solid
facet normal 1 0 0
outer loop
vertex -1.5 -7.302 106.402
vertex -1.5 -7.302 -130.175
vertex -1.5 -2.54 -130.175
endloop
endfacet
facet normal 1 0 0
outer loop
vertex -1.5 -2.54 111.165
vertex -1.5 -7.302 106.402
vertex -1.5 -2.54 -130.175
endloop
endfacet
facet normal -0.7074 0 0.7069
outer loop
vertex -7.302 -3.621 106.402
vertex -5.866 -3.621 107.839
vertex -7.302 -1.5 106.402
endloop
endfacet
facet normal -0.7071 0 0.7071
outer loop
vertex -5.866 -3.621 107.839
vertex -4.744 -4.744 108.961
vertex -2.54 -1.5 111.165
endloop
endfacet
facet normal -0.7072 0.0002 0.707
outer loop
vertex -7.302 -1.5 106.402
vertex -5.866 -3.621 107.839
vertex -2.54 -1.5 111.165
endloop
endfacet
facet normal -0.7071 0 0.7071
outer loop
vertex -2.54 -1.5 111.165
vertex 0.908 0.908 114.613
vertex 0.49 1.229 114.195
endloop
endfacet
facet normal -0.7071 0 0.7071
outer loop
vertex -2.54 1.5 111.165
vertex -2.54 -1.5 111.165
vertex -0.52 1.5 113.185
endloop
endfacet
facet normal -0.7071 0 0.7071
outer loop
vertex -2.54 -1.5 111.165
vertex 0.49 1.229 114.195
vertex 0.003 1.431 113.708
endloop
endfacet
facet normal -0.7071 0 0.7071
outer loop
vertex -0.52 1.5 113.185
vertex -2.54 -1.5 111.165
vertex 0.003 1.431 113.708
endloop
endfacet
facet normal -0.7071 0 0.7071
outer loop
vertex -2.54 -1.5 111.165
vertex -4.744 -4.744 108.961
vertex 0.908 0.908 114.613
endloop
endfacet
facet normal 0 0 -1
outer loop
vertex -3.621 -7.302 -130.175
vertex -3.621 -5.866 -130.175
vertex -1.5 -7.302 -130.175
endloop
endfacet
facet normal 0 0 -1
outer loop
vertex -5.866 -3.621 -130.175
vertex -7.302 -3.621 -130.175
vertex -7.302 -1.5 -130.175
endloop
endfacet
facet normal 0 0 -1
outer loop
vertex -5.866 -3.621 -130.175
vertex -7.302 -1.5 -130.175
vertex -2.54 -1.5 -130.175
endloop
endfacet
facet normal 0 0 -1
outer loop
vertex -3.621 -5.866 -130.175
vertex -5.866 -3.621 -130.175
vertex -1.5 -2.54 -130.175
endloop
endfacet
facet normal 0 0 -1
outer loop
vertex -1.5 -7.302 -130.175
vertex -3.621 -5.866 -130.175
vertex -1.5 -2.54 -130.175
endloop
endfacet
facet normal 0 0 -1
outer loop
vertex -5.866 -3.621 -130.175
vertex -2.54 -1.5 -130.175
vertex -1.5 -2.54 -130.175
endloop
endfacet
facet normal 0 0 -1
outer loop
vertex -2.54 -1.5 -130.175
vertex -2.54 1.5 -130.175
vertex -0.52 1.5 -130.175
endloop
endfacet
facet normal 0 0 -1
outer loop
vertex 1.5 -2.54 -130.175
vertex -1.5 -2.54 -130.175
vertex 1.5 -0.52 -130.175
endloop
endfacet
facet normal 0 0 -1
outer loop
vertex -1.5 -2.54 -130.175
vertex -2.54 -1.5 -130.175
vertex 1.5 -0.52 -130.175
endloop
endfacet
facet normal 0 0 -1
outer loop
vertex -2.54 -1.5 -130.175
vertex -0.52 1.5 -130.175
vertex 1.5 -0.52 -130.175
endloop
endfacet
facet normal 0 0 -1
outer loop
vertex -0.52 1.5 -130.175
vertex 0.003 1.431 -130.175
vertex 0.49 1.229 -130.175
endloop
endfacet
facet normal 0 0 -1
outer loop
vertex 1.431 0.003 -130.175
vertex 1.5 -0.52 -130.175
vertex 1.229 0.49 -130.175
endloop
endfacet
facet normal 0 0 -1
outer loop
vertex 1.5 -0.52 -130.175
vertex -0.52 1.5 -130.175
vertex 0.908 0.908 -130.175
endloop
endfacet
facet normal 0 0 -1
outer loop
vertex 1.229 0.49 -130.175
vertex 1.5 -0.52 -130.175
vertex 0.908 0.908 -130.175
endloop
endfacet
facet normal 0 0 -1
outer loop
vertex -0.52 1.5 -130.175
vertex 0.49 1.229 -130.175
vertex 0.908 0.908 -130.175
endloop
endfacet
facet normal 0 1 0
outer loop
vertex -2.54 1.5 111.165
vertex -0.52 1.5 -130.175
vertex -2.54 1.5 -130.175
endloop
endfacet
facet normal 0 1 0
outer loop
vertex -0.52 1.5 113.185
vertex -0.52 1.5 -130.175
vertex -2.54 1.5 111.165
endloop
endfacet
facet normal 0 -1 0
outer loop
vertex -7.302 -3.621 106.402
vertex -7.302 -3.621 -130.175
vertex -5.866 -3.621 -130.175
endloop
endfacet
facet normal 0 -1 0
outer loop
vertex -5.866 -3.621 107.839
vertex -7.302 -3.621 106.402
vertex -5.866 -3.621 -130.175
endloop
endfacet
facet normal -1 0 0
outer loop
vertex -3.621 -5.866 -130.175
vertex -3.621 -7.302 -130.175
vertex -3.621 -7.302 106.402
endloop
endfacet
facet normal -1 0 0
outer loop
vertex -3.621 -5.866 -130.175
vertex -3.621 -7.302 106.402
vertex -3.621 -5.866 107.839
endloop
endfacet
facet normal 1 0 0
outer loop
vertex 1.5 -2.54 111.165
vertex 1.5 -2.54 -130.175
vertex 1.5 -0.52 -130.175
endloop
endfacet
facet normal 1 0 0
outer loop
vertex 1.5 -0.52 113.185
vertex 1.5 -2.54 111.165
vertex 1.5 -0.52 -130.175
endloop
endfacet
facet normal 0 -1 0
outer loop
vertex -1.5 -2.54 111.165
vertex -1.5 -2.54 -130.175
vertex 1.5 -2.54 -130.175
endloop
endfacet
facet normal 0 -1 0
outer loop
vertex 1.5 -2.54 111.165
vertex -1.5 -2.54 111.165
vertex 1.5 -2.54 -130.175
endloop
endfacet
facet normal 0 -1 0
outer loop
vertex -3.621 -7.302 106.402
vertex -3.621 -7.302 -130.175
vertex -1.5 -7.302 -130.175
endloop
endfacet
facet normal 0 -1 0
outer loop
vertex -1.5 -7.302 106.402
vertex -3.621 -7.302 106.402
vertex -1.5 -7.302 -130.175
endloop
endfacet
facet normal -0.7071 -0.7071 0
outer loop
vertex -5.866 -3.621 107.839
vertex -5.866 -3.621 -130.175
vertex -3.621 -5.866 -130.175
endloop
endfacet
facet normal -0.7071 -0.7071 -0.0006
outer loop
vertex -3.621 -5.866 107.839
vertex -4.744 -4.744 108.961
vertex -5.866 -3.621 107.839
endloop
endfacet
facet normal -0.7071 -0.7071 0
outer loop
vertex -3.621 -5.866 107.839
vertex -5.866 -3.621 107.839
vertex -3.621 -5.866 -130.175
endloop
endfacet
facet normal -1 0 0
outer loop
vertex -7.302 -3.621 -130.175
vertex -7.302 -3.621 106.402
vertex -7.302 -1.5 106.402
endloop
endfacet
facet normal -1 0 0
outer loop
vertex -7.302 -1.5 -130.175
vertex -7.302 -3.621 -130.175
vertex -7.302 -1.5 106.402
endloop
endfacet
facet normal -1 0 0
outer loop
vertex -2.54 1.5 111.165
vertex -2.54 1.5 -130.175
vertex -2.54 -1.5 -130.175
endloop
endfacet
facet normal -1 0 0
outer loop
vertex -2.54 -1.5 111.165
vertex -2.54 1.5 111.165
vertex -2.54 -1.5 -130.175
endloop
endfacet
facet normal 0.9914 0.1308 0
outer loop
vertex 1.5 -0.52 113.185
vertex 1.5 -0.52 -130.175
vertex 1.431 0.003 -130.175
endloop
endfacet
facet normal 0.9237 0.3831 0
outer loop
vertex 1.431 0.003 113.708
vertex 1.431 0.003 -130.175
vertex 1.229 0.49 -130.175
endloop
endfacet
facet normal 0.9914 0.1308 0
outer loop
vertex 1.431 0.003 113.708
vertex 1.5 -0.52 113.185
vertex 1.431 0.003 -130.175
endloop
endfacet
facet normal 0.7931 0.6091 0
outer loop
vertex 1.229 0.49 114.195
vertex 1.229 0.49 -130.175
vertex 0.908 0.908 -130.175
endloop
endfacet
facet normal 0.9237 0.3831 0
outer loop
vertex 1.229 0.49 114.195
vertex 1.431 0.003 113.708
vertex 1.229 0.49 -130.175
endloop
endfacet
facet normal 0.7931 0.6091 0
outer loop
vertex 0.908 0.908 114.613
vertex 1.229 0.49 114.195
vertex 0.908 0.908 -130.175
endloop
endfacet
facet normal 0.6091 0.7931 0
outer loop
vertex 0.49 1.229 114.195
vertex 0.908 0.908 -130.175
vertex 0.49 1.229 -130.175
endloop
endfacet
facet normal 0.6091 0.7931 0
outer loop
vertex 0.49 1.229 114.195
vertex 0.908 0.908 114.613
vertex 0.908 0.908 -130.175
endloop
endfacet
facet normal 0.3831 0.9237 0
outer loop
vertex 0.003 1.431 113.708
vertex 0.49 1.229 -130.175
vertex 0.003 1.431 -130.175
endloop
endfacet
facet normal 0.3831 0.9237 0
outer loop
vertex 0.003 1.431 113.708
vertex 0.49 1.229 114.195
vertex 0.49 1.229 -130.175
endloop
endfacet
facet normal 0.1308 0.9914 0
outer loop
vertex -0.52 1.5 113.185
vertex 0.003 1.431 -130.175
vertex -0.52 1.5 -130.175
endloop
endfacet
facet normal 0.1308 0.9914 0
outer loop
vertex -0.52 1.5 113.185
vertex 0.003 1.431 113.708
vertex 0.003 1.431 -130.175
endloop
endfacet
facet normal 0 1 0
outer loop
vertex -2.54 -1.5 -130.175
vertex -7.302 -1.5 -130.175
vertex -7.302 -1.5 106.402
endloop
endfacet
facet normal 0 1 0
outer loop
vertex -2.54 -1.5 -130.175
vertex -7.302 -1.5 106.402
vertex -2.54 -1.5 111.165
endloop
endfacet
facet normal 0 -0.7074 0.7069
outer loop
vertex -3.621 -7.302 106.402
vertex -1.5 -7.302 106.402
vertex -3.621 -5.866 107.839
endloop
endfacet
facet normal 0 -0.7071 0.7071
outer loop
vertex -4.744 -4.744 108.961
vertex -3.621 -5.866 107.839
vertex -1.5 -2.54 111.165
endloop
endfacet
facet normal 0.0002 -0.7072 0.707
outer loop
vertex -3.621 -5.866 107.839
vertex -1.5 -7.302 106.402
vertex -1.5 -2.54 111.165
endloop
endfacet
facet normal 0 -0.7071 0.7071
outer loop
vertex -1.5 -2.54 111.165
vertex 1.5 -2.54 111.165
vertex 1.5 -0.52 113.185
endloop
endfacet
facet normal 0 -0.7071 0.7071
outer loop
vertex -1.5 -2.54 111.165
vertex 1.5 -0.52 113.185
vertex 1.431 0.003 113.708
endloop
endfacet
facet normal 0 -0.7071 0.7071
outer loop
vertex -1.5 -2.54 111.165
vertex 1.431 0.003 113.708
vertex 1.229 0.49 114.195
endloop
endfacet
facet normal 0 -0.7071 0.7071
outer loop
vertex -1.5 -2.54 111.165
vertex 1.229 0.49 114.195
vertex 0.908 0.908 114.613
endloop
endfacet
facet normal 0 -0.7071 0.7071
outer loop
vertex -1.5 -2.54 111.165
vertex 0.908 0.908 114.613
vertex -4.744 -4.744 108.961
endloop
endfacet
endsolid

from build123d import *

# Parameters (mm, degrees)
SKETCH7_W               = 4.7625
SKETCH7_H               = 2.12122512
BOSS_EXTRUDE2_DEPTH     = 130.175
SKETCH8_W               = 2.12122512
SKETCH8_H               = 4.7625
BOSS_EXTRUDE3_DEPTH     = 130.175
BOSS_EXTRUDE4_DEPTH     = 130.175
CUT_EXTRUDE1_DEPTH      = 150.236313895
CUT_EXTRUDE1_DEPTH_BACK = 12.241080233


with BuildPart() as part:
    # Sketch7 → Boss-Extrude2 (new body, symmetric)
    with BuildSketch(Plane.XY):
        with Locations((-4.92125, -2.560612608)):
            Rectangle(SKETCH7_W, SKETCH7_H)
    extrude(amount=BOSS_EXTRUDE2_DEPTH, both=True)

    # Sketch8 → Boss-Extrude3 (add, symmetric)
    with BuildSketch(Plane.XY):
        with Locations((-2.560612608, -4.92125)):
            Rectangle(SKETCH8_W, SKETCH8_H)
    extrude(amount=BOSS_EXTRUDE3_DEPTH, both=True)

    # Sketch11 → Boss-Extrude4 (add, symmetric)
    with BuildSketch(Plane.XY):
        with BuildLine():
            Line((-2.54, 1.500000048), (-2.54, -1.500000048))
            Line((-2.54, -1.500000048), (-7.3025, -1.500000048))
            Line((-7.3025, -1.500000048), (-7.3025, -3.621225168))
            Line((-7.3025, -3.621225168), (-5.866289198, -3.621225168))
            Line((-5.866289198, -3.621225168), (-3.621225168, -5.866289198))
            Line((-3.621225168, -5.866289198), (-3.621225168, -7.3025))
            Line((-3.621225168, -7.3025), (-1.500000048, -7.3025))
            Line((-1.500000048, -7.3025), (-1.500000048, -2.54))
            Line((-1.500000048, -2.54), (1.500000048, -2.54))
            Line((1.500000048, -2.54), (1.500000048, -0.519999976))
            ThreePointArc((1.500000048, -0.519999976), (0.908355739, 0.908355739), (-0.519999976, 1.500000048))
            Line((-0.519999976, 1.500000048), (-2.54, 1.500000048))
        make_face()
    extrude(amount=BOSS_EXTRUDE4_DEPTH, both=True)

    # Sketch17 → Cut-Extrude1 (cut, two sides)
    with BuildSketch(Plane(origin=(0, 0, 113.704878), x_dir=(0.707106781, 0, -0.707106781), z_dir=(-0.577350269, -0.577350269, -0.577350269))) as cut_extrude1_sk:
        Polygon((9.347296833, 5.396664343), (0, 0), (0, -10.793328686), (-219.970452561, 116.206671314), (-210.623155728, 132.396664343), align=None)
    extrude(amount=CUT_EXTRUDE1_DEPTH, mode=Mode.SUBTRACT)
    extrude(cut_extrude1_sk.sketch, amount=-CUT_EXTRUDE1_DEPTH_BACK, mode=Mode.SUBTRACT)


solid = part.part
